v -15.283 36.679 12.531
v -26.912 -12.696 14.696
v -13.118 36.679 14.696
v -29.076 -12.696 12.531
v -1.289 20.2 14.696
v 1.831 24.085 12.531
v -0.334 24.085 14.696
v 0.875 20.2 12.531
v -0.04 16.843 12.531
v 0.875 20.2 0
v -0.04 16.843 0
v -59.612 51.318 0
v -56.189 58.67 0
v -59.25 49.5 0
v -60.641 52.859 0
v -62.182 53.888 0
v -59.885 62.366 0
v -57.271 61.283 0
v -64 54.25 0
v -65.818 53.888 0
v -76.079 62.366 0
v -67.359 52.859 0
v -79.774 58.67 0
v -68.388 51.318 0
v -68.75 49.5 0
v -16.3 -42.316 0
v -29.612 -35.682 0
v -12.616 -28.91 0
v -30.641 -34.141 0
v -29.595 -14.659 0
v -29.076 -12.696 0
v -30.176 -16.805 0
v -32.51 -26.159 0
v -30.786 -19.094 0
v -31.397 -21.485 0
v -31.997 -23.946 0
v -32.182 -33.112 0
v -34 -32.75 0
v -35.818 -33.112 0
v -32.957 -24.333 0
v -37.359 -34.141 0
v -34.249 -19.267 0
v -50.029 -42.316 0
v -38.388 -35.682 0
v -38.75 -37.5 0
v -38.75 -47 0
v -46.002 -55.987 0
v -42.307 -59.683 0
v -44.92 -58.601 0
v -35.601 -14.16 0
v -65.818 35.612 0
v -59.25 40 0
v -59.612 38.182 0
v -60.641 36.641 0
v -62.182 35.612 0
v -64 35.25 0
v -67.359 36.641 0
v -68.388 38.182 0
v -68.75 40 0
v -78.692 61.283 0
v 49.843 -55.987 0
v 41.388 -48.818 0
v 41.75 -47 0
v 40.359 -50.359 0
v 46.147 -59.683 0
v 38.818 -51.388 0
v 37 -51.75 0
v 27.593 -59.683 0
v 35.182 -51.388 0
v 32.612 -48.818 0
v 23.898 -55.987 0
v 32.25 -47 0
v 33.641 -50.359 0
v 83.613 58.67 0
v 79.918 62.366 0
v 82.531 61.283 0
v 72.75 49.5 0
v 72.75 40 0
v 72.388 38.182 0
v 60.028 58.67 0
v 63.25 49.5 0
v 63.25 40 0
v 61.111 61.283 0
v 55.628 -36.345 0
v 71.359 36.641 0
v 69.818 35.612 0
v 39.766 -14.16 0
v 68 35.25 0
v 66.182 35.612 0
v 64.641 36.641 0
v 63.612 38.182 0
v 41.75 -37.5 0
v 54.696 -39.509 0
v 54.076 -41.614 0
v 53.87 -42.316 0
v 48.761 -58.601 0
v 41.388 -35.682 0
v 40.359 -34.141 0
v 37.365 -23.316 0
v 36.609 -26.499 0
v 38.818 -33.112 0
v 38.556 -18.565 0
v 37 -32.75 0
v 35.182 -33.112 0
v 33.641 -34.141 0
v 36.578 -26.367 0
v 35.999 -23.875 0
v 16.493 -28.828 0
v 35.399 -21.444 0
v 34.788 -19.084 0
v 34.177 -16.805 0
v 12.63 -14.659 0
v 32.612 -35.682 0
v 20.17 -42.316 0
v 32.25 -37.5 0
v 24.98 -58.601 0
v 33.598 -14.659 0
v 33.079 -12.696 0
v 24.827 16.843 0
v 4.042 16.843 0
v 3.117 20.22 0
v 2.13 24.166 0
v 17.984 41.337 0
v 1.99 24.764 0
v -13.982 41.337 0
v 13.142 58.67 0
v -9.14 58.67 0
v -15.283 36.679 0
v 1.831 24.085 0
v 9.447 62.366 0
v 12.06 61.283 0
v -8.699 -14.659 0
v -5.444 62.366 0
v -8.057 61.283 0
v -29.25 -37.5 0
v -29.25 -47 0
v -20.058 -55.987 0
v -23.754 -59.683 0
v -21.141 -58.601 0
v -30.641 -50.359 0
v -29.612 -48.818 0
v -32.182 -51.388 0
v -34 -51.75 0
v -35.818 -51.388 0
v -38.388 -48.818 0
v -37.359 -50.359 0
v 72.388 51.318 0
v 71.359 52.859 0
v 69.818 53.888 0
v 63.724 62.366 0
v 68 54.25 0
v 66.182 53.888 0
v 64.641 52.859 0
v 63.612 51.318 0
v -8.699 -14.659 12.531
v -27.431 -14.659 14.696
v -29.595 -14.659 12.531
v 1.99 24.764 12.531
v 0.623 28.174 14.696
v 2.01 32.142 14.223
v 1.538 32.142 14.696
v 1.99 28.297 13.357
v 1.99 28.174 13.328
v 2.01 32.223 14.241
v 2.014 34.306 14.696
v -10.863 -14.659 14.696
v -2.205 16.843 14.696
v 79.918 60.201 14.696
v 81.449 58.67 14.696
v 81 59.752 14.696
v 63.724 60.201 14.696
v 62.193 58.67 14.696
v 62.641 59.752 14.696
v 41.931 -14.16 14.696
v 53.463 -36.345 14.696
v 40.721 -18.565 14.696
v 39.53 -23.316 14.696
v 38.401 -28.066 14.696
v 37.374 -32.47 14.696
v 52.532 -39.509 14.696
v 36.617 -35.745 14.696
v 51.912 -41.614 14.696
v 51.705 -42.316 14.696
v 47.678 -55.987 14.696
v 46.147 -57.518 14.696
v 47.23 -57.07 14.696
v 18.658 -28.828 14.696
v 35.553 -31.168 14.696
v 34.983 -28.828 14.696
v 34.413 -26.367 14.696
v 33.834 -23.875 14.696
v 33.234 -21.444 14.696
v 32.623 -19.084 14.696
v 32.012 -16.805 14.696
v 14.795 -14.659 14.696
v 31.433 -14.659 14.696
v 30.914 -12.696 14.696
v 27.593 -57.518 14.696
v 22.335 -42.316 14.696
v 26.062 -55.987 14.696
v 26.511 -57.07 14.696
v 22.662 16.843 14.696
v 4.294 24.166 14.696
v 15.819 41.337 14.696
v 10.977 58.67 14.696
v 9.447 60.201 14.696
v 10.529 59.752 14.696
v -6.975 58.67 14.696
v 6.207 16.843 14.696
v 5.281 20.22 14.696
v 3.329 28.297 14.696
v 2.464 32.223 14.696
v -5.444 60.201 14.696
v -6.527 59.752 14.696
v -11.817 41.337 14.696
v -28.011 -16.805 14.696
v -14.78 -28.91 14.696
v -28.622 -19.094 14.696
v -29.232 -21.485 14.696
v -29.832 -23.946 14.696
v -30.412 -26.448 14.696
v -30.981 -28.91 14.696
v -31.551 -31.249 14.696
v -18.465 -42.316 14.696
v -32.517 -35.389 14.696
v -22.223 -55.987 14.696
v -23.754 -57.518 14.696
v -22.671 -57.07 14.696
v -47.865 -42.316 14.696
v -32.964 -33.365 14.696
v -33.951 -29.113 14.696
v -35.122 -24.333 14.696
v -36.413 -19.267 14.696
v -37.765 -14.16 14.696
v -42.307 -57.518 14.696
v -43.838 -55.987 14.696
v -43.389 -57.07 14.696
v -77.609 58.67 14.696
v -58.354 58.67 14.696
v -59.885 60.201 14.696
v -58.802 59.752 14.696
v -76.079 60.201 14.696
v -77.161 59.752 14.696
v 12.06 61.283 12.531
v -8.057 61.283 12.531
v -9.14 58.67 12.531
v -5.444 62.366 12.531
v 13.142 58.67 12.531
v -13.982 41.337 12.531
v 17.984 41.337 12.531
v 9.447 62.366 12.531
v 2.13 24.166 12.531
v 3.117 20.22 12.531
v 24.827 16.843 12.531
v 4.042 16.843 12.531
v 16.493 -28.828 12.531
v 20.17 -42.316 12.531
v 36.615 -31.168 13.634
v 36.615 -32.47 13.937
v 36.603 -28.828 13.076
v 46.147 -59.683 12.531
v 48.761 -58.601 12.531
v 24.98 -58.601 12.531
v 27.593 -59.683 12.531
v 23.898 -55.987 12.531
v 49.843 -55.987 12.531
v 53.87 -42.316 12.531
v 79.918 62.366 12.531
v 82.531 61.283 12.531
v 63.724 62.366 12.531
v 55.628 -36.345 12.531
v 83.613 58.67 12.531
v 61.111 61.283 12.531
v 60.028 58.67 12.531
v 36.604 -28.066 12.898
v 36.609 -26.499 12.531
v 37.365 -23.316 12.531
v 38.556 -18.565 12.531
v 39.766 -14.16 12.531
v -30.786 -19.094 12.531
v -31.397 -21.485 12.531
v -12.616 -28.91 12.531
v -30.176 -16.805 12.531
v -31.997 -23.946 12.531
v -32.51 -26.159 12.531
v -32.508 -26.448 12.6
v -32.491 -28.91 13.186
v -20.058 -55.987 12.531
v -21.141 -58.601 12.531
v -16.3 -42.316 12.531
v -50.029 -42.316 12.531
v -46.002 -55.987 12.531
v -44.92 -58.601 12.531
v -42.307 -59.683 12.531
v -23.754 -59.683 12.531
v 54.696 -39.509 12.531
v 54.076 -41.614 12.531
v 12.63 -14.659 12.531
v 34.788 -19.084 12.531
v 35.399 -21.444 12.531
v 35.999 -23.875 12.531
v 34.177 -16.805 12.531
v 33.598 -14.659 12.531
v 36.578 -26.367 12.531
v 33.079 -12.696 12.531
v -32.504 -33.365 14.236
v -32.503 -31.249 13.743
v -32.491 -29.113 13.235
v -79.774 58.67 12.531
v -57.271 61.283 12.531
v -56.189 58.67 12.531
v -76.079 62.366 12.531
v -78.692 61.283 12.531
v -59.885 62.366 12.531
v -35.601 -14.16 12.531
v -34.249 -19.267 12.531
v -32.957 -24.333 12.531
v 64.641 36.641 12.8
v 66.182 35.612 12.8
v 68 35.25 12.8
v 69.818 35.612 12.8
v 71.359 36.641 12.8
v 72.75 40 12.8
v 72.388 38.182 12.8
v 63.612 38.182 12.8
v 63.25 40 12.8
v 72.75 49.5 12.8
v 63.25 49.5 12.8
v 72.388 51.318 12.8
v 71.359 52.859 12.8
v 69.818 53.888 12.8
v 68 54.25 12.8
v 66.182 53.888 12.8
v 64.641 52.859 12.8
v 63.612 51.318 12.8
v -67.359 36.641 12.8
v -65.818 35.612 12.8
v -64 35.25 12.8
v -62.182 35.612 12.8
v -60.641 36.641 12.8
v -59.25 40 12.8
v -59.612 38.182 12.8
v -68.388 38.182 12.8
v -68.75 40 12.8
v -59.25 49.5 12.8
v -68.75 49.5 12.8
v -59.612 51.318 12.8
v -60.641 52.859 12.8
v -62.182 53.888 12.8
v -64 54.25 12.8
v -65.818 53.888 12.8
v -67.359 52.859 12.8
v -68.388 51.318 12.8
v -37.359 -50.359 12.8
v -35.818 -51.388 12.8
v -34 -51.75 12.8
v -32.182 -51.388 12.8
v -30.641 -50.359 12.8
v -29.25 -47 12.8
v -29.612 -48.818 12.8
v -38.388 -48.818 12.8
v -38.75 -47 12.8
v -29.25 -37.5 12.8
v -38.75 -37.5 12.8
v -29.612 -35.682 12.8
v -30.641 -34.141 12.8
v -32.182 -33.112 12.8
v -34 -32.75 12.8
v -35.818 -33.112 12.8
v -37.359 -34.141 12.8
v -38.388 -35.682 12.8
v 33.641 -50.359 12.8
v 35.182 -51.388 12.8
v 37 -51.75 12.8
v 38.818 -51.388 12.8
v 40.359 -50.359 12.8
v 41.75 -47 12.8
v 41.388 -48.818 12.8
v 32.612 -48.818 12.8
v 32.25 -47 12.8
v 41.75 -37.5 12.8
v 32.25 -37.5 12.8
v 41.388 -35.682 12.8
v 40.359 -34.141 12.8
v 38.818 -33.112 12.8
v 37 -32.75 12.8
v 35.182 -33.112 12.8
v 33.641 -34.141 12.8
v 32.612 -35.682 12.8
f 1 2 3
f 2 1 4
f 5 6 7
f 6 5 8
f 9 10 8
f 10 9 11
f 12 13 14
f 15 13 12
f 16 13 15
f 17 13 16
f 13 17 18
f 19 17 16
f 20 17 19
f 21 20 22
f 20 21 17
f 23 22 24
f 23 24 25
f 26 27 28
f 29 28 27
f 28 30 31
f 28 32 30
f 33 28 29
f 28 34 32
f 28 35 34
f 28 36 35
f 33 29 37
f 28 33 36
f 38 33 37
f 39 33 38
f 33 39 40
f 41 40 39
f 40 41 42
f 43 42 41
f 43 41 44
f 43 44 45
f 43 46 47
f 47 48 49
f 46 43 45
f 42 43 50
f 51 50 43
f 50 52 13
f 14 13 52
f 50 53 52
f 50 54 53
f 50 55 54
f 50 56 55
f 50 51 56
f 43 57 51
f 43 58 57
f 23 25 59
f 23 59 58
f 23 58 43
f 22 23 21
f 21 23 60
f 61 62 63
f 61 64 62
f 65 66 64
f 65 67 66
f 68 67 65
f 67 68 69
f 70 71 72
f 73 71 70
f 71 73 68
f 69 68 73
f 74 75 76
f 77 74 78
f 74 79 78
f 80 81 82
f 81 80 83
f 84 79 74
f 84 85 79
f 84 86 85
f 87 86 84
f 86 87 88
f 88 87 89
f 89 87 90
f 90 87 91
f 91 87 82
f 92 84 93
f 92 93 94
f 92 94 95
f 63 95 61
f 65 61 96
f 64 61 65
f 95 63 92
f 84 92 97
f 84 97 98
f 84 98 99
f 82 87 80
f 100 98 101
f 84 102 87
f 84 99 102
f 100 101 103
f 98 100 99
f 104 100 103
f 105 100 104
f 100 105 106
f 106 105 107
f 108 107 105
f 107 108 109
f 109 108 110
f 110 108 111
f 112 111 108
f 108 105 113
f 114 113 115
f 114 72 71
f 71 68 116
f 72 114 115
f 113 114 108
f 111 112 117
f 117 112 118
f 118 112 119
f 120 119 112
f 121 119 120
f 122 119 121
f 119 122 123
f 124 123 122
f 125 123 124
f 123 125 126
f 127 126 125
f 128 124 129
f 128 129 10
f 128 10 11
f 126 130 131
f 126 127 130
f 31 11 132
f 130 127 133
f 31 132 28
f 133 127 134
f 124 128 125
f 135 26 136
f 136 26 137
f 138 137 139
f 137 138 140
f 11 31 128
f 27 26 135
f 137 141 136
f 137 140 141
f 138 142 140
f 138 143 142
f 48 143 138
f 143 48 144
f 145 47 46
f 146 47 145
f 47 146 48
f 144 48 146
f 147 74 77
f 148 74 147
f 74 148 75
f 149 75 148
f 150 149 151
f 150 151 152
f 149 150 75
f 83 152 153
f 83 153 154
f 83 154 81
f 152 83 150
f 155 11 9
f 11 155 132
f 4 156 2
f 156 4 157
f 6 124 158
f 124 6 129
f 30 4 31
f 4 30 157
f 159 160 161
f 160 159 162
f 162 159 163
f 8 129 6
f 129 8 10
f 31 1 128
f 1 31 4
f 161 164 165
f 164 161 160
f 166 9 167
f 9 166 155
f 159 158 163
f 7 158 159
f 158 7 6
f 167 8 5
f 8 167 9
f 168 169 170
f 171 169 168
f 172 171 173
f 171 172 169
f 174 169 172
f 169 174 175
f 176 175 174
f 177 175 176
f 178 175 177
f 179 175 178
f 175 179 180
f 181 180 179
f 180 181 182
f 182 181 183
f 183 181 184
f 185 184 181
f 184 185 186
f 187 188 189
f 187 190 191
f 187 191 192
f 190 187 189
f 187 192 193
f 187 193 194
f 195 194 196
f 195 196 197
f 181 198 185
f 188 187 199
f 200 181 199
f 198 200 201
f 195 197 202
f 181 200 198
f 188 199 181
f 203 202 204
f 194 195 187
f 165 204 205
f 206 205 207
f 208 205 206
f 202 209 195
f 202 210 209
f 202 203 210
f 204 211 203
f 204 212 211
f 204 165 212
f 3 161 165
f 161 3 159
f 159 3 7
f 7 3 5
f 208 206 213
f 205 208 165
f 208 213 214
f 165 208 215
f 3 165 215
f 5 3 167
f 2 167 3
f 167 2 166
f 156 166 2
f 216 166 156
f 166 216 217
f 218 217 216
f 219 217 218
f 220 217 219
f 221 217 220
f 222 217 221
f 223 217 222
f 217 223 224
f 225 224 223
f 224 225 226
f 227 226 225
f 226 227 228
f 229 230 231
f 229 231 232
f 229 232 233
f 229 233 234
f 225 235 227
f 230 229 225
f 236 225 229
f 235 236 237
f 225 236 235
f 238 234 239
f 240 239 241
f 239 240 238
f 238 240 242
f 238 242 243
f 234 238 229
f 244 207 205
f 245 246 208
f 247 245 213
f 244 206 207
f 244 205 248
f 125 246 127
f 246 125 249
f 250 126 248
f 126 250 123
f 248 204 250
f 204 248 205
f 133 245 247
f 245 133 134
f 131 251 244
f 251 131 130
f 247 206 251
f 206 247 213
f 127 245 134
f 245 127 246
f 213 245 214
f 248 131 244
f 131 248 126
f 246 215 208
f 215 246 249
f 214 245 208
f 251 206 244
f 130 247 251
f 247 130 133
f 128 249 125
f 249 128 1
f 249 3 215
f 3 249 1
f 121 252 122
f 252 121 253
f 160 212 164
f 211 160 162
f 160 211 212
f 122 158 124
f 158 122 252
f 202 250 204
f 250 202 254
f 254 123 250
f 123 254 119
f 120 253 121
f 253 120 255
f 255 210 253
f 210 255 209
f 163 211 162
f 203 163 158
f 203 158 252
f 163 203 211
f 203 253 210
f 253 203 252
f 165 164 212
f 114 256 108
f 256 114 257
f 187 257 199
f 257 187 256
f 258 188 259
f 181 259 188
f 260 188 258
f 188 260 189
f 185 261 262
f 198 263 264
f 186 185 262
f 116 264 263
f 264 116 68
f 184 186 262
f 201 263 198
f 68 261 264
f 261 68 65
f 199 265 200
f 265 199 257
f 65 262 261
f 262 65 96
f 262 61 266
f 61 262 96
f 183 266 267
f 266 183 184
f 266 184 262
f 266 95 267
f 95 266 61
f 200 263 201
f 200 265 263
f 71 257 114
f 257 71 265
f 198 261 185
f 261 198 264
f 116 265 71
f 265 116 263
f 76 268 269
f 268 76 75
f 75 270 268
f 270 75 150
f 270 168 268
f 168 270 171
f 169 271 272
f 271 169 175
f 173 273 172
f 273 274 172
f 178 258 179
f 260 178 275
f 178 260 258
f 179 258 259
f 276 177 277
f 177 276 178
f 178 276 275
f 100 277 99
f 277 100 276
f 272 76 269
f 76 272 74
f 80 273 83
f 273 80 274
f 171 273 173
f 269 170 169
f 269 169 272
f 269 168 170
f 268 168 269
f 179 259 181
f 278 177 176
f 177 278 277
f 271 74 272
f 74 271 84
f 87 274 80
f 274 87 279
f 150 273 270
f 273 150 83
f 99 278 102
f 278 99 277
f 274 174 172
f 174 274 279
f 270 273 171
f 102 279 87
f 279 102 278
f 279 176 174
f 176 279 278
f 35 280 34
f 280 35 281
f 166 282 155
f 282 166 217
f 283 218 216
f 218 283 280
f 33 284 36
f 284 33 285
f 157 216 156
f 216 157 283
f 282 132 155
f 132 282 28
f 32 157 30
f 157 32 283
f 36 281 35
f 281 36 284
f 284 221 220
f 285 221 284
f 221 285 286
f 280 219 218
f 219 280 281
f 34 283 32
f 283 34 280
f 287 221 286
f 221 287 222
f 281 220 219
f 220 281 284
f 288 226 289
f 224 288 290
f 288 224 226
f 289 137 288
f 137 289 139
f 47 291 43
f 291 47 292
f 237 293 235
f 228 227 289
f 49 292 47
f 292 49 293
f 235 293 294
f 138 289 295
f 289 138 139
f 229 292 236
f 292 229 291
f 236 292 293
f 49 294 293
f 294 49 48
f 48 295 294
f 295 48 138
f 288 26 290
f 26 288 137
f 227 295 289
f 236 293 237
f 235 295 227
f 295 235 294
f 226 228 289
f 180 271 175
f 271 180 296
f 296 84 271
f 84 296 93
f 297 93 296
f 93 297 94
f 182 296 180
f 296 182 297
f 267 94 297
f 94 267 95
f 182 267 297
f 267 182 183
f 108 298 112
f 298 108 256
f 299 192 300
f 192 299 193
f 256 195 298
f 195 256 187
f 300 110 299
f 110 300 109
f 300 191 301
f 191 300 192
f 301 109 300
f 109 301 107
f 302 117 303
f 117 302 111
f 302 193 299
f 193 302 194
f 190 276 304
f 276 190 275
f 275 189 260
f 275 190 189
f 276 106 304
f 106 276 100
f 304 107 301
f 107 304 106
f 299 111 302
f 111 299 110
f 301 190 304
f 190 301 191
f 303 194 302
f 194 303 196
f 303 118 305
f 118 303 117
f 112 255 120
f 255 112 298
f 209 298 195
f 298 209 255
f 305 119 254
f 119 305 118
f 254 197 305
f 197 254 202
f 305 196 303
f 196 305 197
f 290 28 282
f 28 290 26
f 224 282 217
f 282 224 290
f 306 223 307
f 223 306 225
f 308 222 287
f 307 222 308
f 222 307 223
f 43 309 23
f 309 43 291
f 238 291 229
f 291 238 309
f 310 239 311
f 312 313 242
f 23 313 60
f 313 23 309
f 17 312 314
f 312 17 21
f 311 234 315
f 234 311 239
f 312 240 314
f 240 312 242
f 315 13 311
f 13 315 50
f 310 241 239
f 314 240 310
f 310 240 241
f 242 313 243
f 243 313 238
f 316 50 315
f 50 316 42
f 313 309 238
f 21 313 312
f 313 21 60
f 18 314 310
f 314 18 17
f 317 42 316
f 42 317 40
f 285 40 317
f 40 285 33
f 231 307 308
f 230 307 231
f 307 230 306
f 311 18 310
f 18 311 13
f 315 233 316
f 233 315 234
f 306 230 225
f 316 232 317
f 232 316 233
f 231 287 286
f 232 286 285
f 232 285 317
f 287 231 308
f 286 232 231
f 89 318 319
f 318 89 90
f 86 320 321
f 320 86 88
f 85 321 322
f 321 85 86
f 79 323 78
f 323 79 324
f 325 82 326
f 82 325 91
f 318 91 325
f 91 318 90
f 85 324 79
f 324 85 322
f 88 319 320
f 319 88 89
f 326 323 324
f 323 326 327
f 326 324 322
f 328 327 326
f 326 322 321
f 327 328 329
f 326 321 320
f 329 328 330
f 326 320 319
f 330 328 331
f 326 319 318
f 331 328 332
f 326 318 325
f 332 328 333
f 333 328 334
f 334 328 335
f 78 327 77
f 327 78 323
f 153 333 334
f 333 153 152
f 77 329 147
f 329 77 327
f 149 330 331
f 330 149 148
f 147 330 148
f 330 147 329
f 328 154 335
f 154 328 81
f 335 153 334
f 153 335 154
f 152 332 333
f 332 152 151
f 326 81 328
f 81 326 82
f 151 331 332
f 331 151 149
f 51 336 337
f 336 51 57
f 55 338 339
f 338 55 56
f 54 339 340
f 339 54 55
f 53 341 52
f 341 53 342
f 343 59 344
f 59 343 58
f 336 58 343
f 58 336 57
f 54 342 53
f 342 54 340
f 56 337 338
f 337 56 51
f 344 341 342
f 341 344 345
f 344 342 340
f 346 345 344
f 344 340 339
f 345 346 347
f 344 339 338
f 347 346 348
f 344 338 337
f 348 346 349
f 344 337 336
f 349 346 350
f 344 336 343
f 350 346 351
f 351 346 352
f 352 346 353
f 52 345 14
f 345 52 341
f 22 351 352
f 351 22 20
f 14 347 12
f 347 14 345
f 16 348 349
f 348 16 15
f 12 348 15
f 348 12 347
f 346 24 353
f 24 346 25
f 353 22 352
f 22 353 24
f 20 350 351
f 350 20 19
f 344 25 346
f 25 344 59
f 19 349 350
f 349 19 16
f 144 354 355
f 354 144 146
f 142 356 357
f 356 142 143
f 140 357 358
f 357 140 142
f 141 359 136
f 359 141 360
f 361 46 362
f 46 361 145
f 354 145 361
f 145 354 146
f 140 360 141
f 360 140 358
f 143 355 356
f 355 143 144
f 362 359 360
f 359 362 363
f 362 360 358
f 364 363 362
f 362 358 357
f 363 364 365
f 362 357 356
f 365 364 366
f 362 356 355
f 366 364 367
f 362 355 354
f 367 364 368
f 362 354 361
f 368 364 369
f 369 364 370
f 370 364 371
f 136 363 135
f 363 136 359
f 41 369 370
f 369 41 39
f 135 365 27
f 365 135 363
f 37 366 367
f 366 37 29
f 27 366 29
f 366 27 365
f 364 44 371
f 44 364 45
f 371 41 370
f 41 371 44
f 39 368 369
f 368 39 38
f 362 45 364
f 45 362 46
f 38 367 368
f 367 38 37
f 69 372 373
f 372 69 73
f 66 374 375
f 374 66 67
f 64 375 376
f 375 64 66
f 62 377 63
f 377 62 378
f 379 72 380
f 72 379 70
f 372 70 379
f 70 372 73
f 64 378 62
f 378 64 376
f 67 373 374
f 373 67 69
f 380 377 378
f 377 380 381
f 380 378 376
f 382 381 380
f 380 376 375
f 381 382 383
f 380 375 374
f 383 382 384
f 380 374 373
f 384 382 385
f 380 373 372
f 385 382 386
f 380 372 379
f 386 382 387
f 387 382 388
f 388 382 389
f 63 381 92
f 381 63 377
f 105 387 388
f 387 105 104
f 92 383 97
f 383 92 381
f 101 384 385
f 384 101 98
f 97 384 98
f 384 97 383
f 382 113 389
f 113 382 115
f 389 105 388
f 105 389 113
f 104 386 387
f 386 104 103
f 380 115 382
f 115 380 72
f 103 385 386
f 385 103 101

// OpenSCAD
// Wall Letter Generator
// Pushpin edition
//
// Author: Erick Neilson 247generator@thingiverse - Copyright 2018
//
// This code generates big letters with rounded top edges that you can use push-pins
// to flush mount to drywall. The holes need to be moved into good positions manually, and
// keeping at least two aligned makes installation easier, especially for asymmetric fonts.
//
// Change the hole size to work with a small screw instead of push-pin in order to fit them in smaller fonts.
//
// The hanging holes appear to be completely open in fast preview to make them easier to 
// position correctly, but they will render properly in the full resolution STL.  
//
// pardon the mess.
//
//


/* [Main Settings] */


// this reduces curve complexity by a quarter for fast preview and shows the full holes for locating - remember to turn off preview before clicking Create Thing
PREVIEW_mode = 0.25; //[0.25:Fast Preview Mode,1:Full Resolution Render Mode]
// the default view is the bottom (back), so to quickly check the top (front):
 flip_over = 0; //[0:Normal Rotation,1:Flip Upside Down]
 rotation = flip_over * [0,180,0];

// (single letter) some fonts can use codes like \u263A (smile) see https://en.wikipedia.org/wiki/Miscellaneous_Symbols
text ="W";

/* [Positions and Colors] */

// how many hanging holes
holes = 4;//[0:4]

letter_color = "Gold";
letter_x = 0;
letter_y = 0;

color1 = "Pink";
hole1_x = 68;
hole1_y = 40;

color2 = "Lime";
hole2_x = -64;
hole2_y = 40;

color3 = "Turquoise";
hole3_x = -34;
hole3_y = -47;

color4 = "Red";
hole4_x = 37;
hole4_y = -47;

/* [Additional Options] */

// Google fonts
font = "Liberation Sans"; // [Arial, ABeeZee, Abel, Abril Fatface, Aclonica, Acme, Actor, Adamina, Advent Pro, Aguafina Script, Akronim, Aladin, Aldrich, Alef, Alegreya, Alegreya SC, Alegreya Sans, Alegreya Sans SC, Alex Brush, Alfa Slab One, Alice, Alike, Alike Angular, Allan, Allerta, Allerta Stencil, Allura, Almendra, Almendra Display, Almendra SC, Amarante, Amaranth, Amatic SC, Amethysta, Amiri, Amita, Anaheim, Andada, Andika, Angkor, Annie Use Your Telescope, Anonymous Pro, Antic, Antic Didone, Antic Slab, Anton, Arapey, Arbutus, Arbutus Slab, Architects Daughter, Archivo Black, Archivo Narrow, Arimo, Arizonia, Armata, Artifika, Arvo, Arya, Asap, Asar, Asset, Astloch, Asul, Atomic Age, Aubrey, Audiowide, Autour One, Average, Average Sans, Averia Gruesa Libre, Averia Libre, Averia Sans Libre, Averia Serif Libre, Bad Script, Balthazar, Bangers, Basic, Battambang, Baumans, Bayon, Belgrano, Belleza, BenchNine, Bentham, Berkshire Swash, Bevan, Bigelow Rules, Bigshot One, Bilbo, Bilbo Swash Caps, Biryani, Bitter, Black Ops One, Bokor, Bonbon, Boogaloo, Bowlby One, Bowlby One SC, Brawler, Bree Serif, Bubblegum Sans, Bubbler One, Buda, Buenard, Butcherman, Butterfly Kids, Cabin, Cabin Condensed, Cabin Sketch, Caesar Dressing, Cagliostro, Calligraffitti, Cambay, Cambo, Candal, Cantarell, Cantata One, Cantora One, Capriola, Cardo, Carme, Carrois Gothic, Carrois Gothic SC, Carter One, Catamaran, Caudex, Caveat, Caveat Brush, Cedarville Cursive, Ceviche One, Changa One, Chango, Chau Philomene One, Chela One, Chelsea Market, Chenla, Cherry Cream Soda, Cherry Swash, Chewy, Chicle, Chivo, Chonburi, Cinzel, Cinzel Decorative, Clicker Script, Coda, Coda Caption, Codystar, Combo, Comfortaa, Coming Soon, Concert One, Condiment, Content, Contrail One, Convergence, Cookie, Copse, Corben, Courgette, Cousine, Coustard, Covered By Your Grace, Crafty Girls, Creepster, Crete Round, Crimson Text, Croissant One, Crushed, Cuprum, Cutive, Cutive Mono, Damion, Dancing Script, Dangrek, Dawning of a New Day, Days One, Dekko, Delius, Delius Swash Caps, Delius Unicase, Della Respira, Denk One, Devonshire, Dhurjati, Didact Gothic, Diplomata, Diplomata SC, Domine, Donegal One, Doppio One, Dorsa, Dosis, Dr Sugiyama, Droid Sans, Droid Sans Mono, Droid Serif, Duru Sans, Dynalight, EB Garamond, Eagle Lake, Eater, Economica, Eczar, Ek Mukta, Electrolize, Elsie, Elsie Swash Caps, Emblema One, Emilys Candy, Engagement, Englebert, Enriqueta, Erica One, Esteban, Euphoria Script, Ewert, Exo, Exo 2, Expletus Sans, Fanwood Text, Fascinate, Fascinate Inline, Faster One, Fasthand, Fauna One, Federant, Federo, Felipa, Fenix, Finger Paint, Fira Mono, Fira Sans, Fjalla One, Fjord One, Flamenco, Flavors, Fondamento, Fontdiner Swanky, Forum, Francois One, Freckle Face, Fredericka the Great, Fredoka One, Freehand, Fresca, Frijole, Fruktur, Fugaz One, GFS Didot, GFS Neohellenic, Gabriela, Gafata, Galdeano, Galindo, Gentium Basic, Gentium Book Basic, Geo, Geostar, Geostar Fill, Germania One, Gidugu, Gilda Display, Give You Glory, Glass Antiqua, Glegoo, Gloria Hallelujah, Goblin One, Gochi Hand, Gorditas, Goudy Bookletter 1911, Graduate, Grand Hotel, Gravitas One, Great Vibes, Griffy, Gruppo, Gudea, Gurajada, Habibi, Halant, Hammersmith One, Hanalei, Hanalei Fill, Handlee, Hanuman, Happy Monkey, Headland One, Henny Penny, Herr Von Muellerhoff, Hind, Hind Siliguri, Hind Vadodara, Holtwood One SC, Homemade Apple, Homenaje, IM Fell DW Pica, IM Fell DW Pica SC, IM Fell Double Pica, IM Fell Double Pica SC, IM Fell English, IM Fell English SC, IM Fell French Canon, IM Fell French Canon SC, IM Fell Great Primer, IM Fell Great Primer SC, Iceberg, Iceland, Imprima, Inconsolata, Inder, Indie Flower, Inika, Inknut Antiqua, Irish Grover, Istok Web, Italiana, Italianno, Itim, Jacques Francois, Jacques Francois Shadow, Jaldi, Jim Nightshade, Jockey One, Jolly Lodger, Josefin Sans, Josefin Slab, Joti One, Judson, Julee, Julius Sans One, Junge, Jura, Just Another Hand, Just Me Again Down Here, Kadwa, Kalam, Kameron, Kantumruy, Karla, Karma, Kaushan Script, Kavoon, Kdam Thmor, Keania One, Kelly Slab, Kenia, Khand, Khmer, Khula, Kite One, Knewave, Kotta One, Koulen, Kranky, Kreon, Kristi, Krona One, Kurale, La Belle Aurore, Laila, Lakki Reddy, Lancelot, Lateef, Lato, League Script, Leckerli One, Ledger, Lekton, Lemon, Liberation Sans, Liberation Serif, Libre Baskerville, Life Savers, Lilita One, Lily Script One, Limelight, Linden Hill, Lobster, Lobster Two, Londrina Outline, Londrina Shadow, Londrina Sketch, Londrina Solid, Lora, Love Ya Like A Sister, Loved by the King, Lovers Quarrel, Luckiest Guy, Lusitana, Lustria, Macondo, Macondo Swash Caps, Magra, Maiden Orange, Mako, Mallanna, Mandali, Marcellus, Marcellus SC, Marck Script, Margarine, Marko One, Marmelad, Martel, Martel Sans, Marvel, Mate, Mate SC, Maven Pro, McLaren, Meddon, MedievalSharp, Medula One, Megrim, Meie Script, Merienda, Merienda One, Merriweather, Merriweather Sans, Metal, Metal Mania, Metamorphous, Metrophobic, Michroma, Milonga, Miltonian, Miltonian Tattoo, Miniver, Miss Fajardose, Modak, Modern Antiqua, Molengo, Molle, Monda, Monofett, Monoton, Monsieur La Doulaise, Montaga, Montez, Montserrat, Montserrat Alternates, Montserrat Subrayada, Moul, Moulpali, Mountains of Christmas, Mouse Memoirs, Mr Bedfort, Mr Dafoe, Mr De Haviland, Mrs Saint Delafield, Mrs Sheppards, Muli, Mystery Quest, NTR, Neucha, Neuton, New Rocker, News Cycle, Niconne, Nixie One, Nobile, Nokora, Norican, Nosifer, Nothing You Could Do, Noticia Text, Noto Sans, Noto Serif, Nova Cut, Nova Flat, Nova Mono, Nova Oval, Nova Round, Nova Script, Nova Slim, Nova Square, Numans, Nunito, Odor Mean Chey, Offside, Old Standard TT, Oldenburg, Oleo Script, Oleo Script Swash Caps, Open Sans, Open Sans Condensed, Oranienbaum, Orbitron, Oregano, Orienta, Original Surfer, Oswald, Over the Rainbow, Overlock, Overlock SC, Ovo, Oxygen, Oxygen Mono, PT Mono, PT Sans, PT Sans Caption, PT Sans Narrow, PT Serif, PT Serif Caption, Pacifico, Palanquin, Palanquin Dark, Paprika, Parisienne, Passero One, Passion One, Pathway Gothic One, Patrick Hand, Patrick Hand SC, Patua One, Paytone One, Peddana, Peralta, Permanent Marker, Petit Formal Script, Petrona, Philosopher, Piedra, Pinyon Script, Pirata One, Plaster, Play, Playball, Playfair Display, Playfair Display SC, Podkova, Poiret One, Poller One, Poly, Pompiere, Pontano Sans, Poppins, Port Lligat Sans, Port Lligat Slab, Pragati Narrow, Prata, Preahvihear, Press Start 2P, Princess Sofia, Prociono, Prosto One, Puritan, Purple Purse, Quando, Quantico, Quattrocento, Quattrocento Sans, Questrial, Quicksand, Quintessential, Qwigley, Racing Sans One, Radley, Rajdhani, Raleway, Raleway Dots, Ramabhadra, Ramaraja, Rambla, Rammetto One, Ranchers, Rancho, Ranga, Rationale, Ravi Prakash, Redressed, Reenie Beanie, Revalia, Rhodium Libre, Ribeye, Ribeye Marrow, Righteous, Risque, Roboto, Roboto Condensed, Roboto Mono, Roboto Slab, Rochester, Rock Salt, Rokkitt, Romanesco, Ropa Sans, Rosario, Rosarivo, Rouge Script, Rozha One, Rubik, Rubik Mono One, Rubik One, Ruda, Rufina, Ruge Boogie, Ruluko, Rum Raisin, Ruslan Display, Russo One, Ruthie, Rye, Sacramento, Sahitya, Sail, Salsa, Sanchez, Sancreek, Sansita One, Sarala, Sarina, Sarpanch, Satisfy, Scada, Scheherazade, Schoolbell, Seaweed Script, Sevillana, Seymour One, Shadows Into Light, Shadows Into Light Two, Shanti, Share, Share Tech, Share Tech Mono, Shojumaru, Short Stack, Siemreap, Sigmar One, Signika, Signika Negative, Simonetta, Sintony, Sirin Stencil, Six Caps, Skranji, Slabo 13px, Slabo 27px, Slackey, Smokum, Smythe, Sniglet, Snippet, Snowburst One, Sofadi One, Sofia, Sonsie One, Sorts Mill Goudy, Source Code Pro, Source Sans Pro, Source Serif Pro, Special Elite, Spicy Rice, Spinnaker, Spirax, Squada One, Sree Krushnadevaraya, Stalemate, Stalinist One, Stardos Stencil, Stint Ultra Condensed, Stint Ultra Expanded, Stoke, Strait, Sue Ellen Francisco, Sumana, Sunshiney, Supermercado One, Sura, Suranna, Suravaram, Suwannaphum, Swanky and Moo Moo, Syncopate, Tangerine, Taprom, Tauri, Teko, Telex, Tenali Ramakrishna, Tenor Sans, Text Me One, The Girl Next Door, Tienne, Tillana, Timmana, Tinos, Titan One, Titillium Web, Trade Winds, Trocchi, Trochut, Trykker, Tulpen One, Ubuntu, Ubuntu Condensed, Ubuntu Mono, Ultra, Uncial Antiqua, Underdog, Unica One, UnifrakturCook, UnifrakturMaguntia, Unkempt, Unlock, Unna, VT323, Vampiro One, Varela, Varela Round, Vast Shadow, Vesper Libre, Vibur, Vidaloka, Viga, Voces, Volkhov, Vollkorn, Voltaire, Waiting for the Sunrise, Wallpoet, Walter Turncoat, Warnes, Wellfleet, Wendy One, Wingdings, Wire One, Work Sans, Yanone Kaffeesatz, Yantramanav, Yellowtail, Yeseva One, Yesteryear, Zeyada]
// font size
letter_size = 120;
// 60+ makes curvy letters look smoother 
rendered_letter_detail = 32; //[32:2:128]
// added space above the screw hole recess to the top surface of the letter
top_shell = 1.5;
// radius of the ball used to round the edges
rounded_corners = 4.0; 
// How curved or polygonal the above rounded edges are
rendered_corner_detail = 32; //[32:2:96]
// for hanging on a wall with screws or pushpins in the wall
screw_head_opening = 9.5;
// make this a bit smaller than the pin to retain pushpins / tacks
screw_shaft_opening = 1.4;
// also most of the total letter thickness
screw_depth = 12.7;
// the amount of plastic keeping the screw or pin from pulling out (between the wall and head)
screw_retention_depth = 0.8;
// hanging hole complexity
rendered_curve_detail = 32; //[32:2:96]


/* [Printer Build Plate] */

// The letter is not automatically centered on the bed, this section is just intended for checking the relative font size.
print_bed_notes = 0; // [0:Q and W tend to be largest letters for checking,1:Also avoid creating it flipped over,2:use Normal Rotation in the first section]
// Check the size of the letter against your printer bed size
show_print_bed = 0; // [0:Hide the print bed,1:Show the circular print bed, 2:Show the rectangular print bed]
circular_bed_diameter = 230;
rectangular_bed_x = 200;
rectangular_bed_y = 280;
bed_height = 2;


/* [Hidden] */

// thingiverse customizer: show us the back by default
// preview[view:north, tilt:bottom]
// equivalent to this in OpenSCAD:
// $vpr = [ 175, 0.00, 180 ] ;

//  $vpr = [ 60, 0.00, 45 ] ;  // This appears to be the default rotational view of thingiverse customizer.


detail_reduction=PREVIEW_mode;
letter_detail=rendered_letter_detail*detail_reduction;
corner_detail=rendered_corner_detail*detail_reduction;
curve_detail=rendered_curve_detail*(detail_reduction*2);


//
// END OF PARAMETERS
//
// %%%%%%%%%%%%%%%%%%%%%%%%%%%%%%%%%%%%%%%%%%%%%%%%%%%%%%%%%%%%%%%%%%%%%%%%%%%%%%%%%%%%%%%%
//
// START OF BUILD
//



// Add up all the internal parts height and then subtract the rounded corners which get added on in all directions except -Z (down)
letter_height = screw_retention_depth + screw_depth + top_shell - rounded_corners;

// Rotate everything to make it easier to see the hole positions

rotate (rotation) {



// printer build plate size & shape preview mechanism, mostly for thingiverse customizer since it has no measurements.

if (show_print_bed == 1) {
    translate ([0,0,-(bed_height/2)-0.1])
    %cylinder (r=circular_bed_diameter/2,h=bed_height,$fn=64, center = true);
}
if (show_print_bed == 2) {
    translate ([0,0,-(bed_height/2)-0.1])
    %cube ([rectangular_bed_x,rectangular_bed_y,bed_height], center = true);
}



difference () { translate ([letter_x,letter_y,0])color (letter_color)  letter(text); 
    if (holes > 0) {
        translate ([hole1_x,hole1_y,0])color (color1) hanger_hole (screw_depth,screw_head_opening,screw_shaft_opening,screw_retention_depth);}
    if (holes > 1) {
        translate ([hole2_x,hole2_y,0])color (color2) hanger_hole (screw_depth,screw_head_opening,screw_shaft_opening,screw_retention_depth);}
    if (holes > 2) {
        translate ([hole3_x,hole3_y,0])color (color3) hanger_hole (screw_depth,screw_head_opening,screw_shaft_opening,screw_retention_depth);}
    if (holes > 3) {
        translate ([hole4_x,hole4_y,0])color (color4) hanger_hole (screw_depth,screw_head_opening,screw_shaft_opening,screw_retention_depth);}
}
        
}


//
// END OF BUILD
//
// %%%%%%%%%%%%%%%%%%%%%%%%%%%%%%%%%%%%%%%%%%%%%%%%%%%%%%%%%%%%%%%%%%%%%%%%%%%%%%%%%%%%%%%
//
// START OF MODULES
//



module hanger_hole (screw_depth,screw_head_opening,screw_shaft_opening,screw_retention_depth) {
    $fn = curve_detail;
    rotate ([0,0,-90]){
// main hanging screw/tack hole
        translate ([0,0,-0.1]) {
            cylinder (h=screw_depth+0.2, r=screw_head_opening/2);
        }

// hanging screw/tack recessed inner slot
        preview_depth_adjust = round(PREVIEW_mode) * screw_retention_depth-0.1;
        hull (){
            translate ([0,0,preview_depth_adjust]) {cylinder (h=(screw_depth)+0.2, r=(screw_head_opening/2));}
            translate ([-screw_head_opening,0,preview_depth_adjust]){cylinder (h=(screw_depth)+0.2, r=(screw_head_opening/2));}
        }
// hanging screw/tack shaft slot
        hull (){
            translate ([0,0,-0.1]) {cylinder (h=(screw_depth)+0.2, r=(screw_shaft_opening/2) );}
            translate ([-screw_head_opening/1.25,0,-0.1]){cylinder (h=(screw_depth)+0.2, r=(screw_shaft_opening/2) );}
        }
    }
} 

module letter(l) {
    letter_fn = letter_detail;
    rounding_fn = corner_detail;
    minkowski () {
        difference () { sphere (r=rounded_corners, $fn=rounding_fn); translate ([0,0,-rounded_corners]) cube (rounded_corners*2,center = true);}
        linear_extrude(height = letter_height) {
            text(l, size = letter_size, font = font, halign = "center", valign = "center", $fn = letter_fn);
        }
    }
}
